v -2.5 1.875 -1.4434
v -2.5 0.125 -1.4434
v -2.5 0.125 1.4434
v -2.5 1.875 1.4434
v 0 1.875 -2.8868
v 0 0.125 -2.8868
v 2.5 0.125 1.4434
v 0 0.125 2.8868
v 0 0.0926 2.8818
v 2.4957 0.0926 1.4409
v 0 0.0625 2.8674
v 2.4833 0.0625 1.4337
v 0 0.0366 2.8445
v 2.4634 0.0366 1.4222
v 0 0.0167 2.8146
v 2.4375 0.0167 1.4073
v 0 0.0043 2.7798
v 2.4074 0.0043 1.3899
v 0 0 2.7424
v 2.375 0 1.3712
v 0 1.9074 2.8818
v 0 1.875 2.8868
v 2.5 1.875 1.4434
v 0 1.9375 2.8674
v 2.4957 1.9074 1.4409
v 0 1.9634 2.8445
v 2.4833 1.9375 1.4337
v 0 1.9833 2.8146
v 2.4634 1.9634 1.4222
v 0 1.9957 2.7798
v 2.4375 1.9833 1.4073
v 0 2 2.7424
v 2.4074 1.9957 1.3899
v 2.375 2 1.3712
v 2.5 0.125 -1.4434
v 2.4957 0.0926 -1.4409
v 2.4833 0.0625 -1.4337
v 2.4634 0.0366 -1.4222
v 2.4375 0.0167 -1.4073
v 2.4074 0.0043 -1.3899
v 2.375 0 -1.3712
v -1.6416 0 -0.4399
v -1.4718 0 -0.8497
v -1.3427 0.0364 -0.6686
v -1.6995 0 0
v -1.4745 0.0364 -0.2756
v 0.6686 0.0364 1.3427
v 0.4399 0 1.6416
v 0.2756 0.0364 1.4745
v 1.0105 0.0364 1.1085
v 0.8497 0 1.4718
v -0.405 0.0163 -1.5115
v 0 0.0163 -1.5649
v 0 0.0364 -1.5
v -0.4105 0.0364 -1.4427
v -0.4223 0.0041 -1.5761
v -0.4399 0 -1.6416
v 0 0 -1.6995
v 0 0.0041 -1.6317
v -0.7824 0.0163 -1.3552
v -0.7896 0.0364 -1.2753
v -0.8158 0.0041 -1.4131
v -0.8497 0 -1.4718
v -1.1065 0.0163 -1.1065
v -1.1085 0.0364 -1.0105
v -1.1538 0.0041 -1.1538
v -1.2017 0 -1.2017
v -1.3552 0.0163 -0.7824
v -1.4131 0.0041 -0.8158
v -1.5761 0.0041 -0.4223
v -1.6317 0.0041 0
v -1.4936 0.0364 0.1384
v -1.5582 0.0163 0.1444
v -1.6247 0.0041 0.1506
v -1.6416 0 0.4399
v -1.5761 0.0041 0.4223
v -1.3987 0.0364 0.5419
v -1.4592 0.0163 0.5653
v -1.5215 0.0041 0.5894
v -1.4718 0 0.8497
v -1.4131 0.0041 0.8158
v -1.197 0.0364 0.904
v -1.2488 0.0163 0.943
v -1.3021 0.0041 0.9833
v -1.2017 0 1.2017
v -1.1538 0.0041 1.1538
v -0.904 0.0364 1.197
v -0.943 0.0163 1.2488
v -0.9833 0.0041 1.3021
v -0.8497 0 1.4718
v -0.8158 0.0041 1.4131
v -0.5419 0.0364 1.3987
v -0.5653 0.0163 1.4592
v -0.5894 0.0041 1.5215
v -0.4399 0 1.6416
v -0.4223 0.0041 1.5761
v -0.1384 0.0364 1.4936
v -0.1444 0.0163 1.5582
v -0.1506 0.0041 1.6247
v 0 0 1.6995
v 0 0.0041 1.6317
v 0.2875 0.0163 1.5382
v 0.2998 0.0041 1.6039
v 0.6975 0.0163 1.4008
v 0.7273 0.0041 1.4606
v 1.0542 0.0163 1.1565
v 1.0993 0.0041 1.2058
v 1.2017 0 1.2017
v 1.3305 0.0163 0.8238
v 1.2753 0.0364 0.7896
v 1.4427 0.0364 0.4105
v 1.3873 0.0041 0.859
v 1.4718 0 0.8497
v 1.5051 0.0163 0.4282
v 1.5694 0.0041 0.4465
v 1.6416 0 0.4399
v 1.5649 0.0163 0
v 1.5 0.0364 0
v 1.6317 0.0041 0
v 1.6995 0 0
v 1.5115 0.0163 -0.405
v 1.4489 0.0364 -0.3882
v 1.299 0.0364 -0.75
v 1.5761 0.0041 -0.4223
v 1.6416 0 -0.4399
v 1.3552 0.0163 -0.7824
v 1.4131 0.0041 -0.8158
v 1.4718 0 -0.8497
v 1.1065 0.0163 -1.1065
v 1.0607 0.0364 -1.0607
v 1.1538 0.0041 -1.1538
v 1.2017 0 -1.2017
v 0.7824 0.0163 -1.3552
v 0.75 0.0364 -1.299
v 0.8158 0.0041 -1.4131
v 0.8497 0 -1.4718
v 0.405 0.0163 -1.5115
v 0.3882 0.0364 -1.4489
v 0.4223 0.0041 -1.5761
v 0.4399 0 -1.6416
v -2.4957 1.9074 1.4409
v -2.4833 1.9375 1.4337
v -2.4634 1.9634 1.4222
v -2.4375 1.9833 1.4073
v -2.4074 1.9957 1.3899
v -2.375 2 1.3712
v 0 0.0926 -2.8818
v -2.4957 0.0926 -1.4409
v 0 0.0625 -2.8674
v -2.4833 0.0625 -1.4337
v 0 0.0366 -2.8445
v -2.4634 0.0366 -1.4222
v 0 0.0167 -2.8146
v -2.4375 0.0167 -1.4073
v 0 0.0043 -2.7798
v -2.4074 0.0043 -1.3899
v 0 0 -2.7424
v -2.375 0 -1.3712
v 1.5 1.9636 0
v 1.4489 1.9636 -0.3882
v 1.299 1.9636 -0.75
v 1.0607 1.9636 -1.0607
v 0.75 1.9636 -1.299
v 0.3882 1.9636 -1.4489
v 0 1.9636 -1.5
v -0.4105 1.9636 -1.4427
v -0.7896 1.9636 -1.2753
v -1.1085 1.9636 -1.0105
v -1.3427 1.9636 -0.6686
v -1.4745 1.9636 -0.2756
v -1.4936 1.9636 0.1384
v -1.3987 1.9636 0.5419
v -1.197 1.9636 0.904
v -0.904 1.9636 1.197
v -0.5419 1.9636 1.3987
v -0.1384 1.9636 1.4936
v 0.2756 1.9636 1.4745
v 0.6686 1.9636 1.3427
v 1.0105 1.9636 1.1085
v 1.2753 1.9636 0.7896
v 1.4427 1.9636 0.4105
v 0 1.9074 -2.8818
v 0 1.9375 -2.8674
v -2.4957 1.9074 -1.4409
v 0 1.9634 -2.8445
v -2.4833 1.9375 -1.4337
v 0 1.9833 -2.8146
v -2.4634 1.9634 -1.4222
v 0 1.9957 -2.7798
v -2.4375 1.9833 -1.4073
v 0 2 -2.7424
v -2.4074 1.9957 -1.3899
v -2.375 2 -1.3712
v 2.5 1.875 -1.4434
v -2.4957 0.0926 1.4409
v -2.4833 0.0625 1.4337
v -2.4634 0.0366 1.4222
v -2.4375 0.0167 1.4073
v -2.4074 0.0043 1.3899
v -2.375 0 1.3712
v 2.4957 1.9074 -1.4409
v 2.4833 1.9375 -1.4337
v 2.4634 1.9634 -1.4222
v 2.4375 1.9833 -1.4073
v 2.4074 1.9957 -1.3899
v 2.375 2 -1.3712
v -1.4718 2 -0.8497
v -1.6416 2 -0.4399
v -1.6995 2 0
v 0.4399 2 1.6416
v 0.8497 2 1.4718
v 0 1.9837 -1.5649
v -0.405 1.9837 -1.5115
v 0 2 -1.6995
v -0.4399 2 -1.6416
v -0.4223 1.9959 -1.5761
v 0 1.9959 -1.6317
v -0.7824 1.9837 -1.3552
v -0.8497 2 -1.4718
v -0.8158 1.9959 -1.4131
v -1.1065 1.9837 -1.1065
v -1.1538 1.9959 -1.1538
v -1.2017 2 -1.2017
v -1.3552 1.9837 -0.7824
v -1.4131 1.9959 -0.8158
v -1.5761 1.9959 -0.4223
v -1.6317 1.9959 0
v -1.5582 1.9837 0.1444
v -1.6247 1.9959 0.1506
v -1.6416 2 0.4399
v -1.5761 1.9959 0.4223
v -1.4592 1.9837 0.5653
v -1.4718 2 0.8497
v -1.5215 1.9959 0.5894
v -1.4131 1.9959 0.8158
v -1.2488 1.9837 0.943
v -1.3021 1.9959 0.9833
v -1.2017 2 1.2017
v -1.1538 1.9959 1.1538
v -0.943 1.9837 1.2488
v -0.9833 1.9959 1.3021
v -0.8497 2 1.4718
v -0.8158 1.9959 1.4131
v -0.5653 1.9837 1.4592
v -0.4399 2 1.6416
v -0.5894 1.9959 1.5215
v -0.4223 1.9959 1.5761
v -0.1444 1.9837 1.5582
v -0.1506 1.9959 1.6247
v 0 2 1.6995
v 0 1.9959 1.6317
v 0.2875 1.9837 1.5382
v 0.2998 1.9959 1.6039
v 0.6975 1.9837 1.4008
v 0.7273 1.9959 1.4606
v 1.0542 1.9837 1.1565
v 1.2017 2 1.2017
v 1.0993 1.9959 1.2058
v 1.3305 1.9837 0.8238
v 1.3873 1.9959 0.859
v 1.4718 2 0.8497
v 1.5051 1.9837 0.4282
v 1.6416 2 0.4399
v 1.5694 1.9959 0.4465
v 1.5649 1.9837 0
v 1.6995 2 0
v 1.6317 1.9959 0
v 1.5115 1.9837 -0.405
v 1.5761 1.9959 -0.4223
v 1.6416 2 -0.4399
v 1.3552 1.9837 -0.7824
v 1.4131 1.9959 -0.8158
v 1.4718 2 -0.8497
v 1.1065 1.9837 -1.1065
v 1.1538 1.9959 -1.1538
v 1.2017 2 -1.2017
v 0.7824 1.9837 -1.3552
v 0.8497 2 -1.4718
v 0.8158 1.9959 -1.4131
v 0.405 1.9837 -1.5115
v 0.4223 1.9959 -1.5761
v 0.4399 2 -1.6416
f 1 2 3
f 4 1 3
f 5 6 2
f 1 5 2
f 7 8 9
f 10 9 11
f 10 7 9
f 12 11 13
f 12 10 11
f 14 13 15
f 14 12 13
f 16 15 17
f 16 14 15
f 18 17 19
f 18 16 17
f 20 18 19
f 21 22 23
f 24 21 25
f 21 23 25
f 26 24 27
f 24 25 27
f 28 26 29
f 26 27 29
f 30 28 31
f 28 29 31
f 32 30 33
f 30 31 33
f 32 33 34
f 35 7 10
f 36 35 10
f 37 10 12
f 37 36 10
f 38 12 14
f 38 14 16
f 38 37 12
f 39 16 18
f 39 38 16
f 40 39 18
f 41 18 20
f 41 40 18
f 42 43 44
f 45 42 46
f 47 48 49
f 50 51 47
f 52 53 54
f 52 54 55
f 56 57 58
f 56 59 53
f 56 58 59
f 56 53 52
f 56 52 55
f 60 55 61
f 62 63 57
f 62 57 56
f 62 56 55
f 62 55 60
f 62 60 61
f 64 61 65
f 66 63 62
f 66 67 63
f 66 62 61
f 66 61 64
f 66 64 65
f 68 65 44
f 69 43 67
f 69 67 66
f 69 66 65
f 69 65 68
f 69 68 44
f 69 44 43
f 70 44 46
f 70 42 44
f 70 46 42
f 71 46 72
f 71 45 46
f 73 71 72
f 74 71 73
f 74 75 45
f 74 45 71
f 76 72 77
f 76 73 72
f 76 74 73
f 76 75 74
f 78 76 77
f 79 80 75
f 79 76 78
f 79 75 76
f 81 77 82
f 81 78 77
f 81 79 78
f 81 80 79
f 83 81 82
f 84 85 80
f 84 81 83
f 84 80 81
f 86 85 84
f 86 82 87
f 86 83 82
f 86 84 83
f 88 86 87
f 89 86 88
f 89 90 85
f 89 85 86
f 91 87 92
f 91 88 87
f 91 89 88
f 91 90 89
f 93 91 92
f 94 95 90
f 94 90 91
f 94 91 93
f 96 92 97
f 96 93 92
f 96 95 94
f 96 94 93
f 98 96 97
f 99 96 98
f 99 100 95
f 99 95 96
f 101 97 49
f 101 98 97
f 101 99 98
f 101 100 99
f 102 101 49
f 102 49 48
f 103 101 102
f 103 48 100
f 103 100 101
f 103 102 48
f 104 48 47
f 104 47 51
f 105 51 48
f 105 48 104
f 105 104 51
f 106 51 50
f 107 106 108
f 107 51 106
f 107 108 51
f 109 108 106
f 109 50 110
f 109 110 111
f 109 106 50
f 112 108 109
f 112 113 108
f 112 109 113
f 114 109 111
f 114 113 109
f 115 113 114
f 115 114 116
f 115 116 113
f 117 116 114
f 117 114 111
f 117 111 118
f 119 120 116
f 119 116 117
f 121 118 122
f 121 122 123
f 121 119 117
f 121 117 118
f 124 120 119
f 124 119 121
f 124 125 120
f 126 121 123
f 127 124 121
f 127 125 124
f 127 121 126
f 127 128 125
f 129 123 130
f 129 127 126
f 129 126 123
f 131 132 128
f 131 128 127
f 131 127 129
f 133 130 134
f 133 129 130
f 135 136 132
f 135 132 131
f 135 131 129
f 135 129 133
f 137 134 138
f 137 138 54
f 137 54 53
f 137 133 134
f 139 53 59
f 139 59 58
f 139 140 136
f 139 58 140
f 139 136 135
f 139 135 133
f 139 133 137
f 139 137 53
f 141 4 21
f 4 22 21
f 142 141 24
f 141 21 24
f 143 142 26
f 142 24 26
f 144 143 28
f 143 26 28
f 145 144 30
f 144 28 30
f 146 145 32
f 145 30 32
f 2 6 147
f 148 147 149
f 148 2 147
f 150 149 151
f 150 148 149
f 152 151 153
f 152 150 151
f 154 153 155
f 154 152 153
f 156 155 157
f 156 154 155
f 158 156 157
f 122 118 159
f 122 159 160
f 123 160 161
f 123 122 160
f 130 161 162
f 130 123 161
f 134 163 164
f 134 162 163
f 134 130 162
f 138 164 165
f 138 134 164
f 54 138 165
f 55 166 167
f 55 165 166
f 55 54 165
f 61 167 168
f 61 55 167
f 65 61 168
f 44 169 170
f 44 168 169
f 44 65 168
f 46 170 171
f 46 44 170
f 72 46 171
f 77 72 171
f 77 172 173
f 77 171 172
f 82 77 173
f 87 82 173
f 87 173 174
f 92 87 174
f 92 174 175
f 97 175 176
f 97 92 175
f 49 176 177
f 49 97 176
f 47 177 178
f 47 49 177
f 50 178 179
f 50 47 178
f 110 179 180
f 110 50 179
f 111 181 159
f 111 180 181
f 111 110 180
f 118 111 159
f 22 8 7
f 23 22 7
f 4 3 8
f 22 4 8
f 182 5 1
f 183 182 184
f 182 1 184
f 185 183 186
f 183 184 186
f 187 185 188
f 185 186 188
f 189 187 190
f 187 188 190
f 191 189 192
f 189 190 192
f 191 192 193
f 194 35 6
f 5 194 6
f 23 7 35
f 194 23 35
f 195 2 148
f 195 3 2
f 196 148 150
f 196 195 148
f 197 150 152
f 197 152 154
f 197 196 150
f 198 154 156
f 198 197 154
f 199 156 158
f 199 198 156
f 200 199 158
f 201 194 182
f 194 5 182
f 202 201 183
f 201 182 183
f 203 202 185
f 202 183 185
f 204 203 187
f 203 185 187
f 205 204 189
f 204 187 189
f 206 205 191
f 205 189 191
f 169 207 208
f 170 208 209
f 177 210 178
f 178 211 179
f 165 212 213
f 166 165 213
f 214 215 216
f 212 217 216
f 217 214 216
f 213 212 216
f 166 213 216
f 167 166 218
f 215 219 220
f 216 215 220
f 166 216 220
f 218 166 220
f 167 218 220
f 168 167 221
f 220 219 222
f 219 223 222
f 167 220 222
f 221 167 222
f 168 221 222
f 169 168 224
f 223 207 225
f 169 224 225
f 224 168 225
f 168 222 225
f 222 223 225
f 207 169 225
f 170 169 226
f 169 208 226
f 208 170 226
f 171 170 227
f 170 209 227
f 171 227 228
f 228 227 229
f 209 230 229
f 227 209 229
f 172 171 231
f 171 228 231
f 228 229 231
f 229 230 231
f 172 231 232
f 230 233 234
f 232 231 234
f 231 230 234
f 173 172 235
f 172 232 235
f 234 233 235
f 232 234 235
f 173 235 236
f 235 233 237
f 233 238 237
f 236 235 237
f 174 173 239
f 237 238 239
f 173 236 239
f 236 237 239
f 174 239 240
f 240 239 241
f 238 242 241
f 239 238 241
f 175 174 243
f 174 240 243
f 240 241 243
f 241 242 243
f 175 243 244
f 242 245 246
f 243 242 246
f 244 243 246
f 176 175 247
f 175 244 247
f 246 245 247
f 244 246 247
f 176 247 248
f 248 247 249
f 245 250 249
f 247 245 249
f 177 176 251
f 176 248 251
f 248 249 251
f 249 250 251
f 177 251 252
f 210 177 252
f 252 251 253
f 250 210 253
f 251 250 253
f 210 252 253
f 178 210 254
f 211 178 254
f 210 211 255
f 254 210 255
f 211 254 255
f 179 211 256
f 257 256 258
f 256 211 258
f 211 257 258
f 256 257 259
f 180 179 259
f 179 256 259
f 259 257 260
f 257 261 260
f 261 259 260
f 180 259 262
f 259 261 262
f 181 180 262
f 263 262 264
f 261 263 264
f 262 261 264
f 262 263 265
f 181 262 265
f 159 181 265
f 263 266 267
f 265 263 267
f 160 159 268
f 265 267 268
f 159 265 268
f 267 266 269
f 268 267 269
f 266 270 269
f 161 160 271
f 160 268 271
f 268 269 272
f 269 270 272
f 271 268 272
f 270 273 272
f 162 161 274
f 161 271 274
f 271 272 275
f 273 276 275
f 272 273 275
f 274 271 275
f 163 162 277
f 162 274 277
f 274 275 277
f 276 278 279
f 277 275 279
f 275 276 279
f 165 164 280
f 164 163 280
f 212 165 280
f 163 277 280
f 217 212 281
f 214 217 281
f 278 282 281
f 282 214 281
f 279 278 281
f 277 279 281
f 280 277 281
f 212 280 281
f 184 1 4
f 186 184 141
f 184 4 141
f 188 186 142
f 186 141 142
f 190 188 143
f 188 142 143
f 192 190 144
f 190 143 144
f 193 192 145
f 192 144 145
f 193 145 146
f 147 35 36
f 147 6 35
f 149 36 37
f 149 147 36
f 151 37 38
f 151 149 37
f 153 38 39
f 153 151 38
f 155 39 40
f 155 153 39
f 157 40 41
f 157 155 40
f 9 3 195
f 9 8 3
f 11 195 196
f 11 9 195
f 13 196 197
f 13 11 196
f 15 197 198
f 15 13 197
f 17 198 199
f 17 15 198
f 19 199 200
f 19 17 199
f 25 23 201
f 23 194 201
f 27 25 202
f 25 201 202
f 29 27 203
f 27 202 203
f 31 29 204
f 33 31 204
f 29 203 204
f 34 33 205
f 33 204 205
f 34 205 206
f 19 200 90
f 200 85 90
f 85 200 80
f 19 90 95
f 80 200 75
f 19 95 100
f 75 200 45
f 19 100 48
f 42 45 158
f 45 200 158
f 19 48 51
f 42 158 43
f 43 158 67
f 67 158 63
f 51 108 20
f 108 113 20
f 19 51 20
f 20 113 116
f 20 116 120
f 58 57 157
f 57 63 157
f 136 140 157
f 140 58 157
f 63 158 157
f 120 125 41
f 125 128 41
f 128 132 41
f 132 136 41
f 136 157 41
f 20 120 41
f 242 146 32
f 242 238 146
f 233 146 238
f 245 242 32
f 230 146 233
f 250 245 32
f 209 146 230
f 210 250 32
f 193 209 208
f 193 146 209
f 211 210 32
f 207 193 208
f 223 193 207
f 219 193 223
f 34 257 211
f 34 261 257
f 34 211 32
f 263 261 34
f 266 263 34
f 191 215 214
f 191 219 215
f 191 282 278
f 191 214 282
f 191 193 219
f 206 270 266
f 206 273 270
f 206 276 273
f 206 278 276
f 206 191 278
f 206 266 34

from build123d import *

# Parameters (mm, degrees)
SKETCH1_R           = 1.5
BOSS_EXTRUDE1_DEPTH = 2
FILLET1_R           = 0.125


with BuildPart() as part:
    # Sketch1 → Boss-Extrude1 (new body)
    with BuildSketch(Plane(origin=(0, 0, 0), x_dir=(1, 0, 0), z_dir=(0, 1, 0))):
        Polygon((0, 2.886751346), (-2.5, 1.443375673), (-2.5, -1.443375673), (0, -2.886751346), (2.5, -1.443375673), (2.5, 1.443375673), align=None)
        Circle(SKETCH1_R, mode=Mode.SUBTRACT)
    extrude(amount=BOSS_EXTRUDE1_DEPTH)

    # Fillet1
    fillet1_edges = [part.edges().sort_by_distance(p)[0] for p in [
        (-2.5, 2, 0),
        (-1.25, 2, 2.165063509),
        (1.25, 2, 2.165063509),
        (2.5, 2, 0),
        (1.25, 2, -2.165063509),
        (2.5, 0, 0),
        (1.25, 0, 2.165063509),
        (-1.25, 0, 2.165063509),
        (-1.25, 2, -2.165063509),
        (-2.5, 0, 0),
        (-1.25, 0, -2.165063509),
        (1.25, 0, -2.165063509),
    ]]
    fillet(fillet1_edges, radius=FILLET1_R)

    # Sketch5 → Cut-Revolve1 (revolve, cut)
    with BuildSketch(Plane(origin=(0, 0, 0), x_dir=(0, 0, -1), z_dir=(1, 0, 0))):
        with BuildLine():
            Line((1.699485543, 2), (1.761177848, 2))
            Line((1.761177848, 2), (1.761177848, 2.100760071))
            Line((1.761177848, 2.100760071), (1.194006659, 2.100760071))
            Line((1.194006659, 2.100760071), (1.194006659, 1.686410093))
            ThreePointArc((1.194006659, 1.686410093), (1.402060119, 1.915234853), (1.699485543, 2))
        make_face()
        with BuildLine():
            Line((1.194006659, -0.100760071), (1.194006659, 0.313589907))
            ThreePointArc((1.194006659, 0.313589907), (1.402060119, 0.084765147), (1.699485543, 0))
            Line((1.699485543, 0), (1.761177848, 0))
            Line((1.761177848, 0), (1.761177848, -0.100760071))
            Line((1.761177848, -0.100760071), (1.194006659, -0.100760071))
        make_face()
    revolve(axis=Axis((0, 0, 0), (0, 1, 0)), mode=Mode.SUBTRACT)


solid = part.part
